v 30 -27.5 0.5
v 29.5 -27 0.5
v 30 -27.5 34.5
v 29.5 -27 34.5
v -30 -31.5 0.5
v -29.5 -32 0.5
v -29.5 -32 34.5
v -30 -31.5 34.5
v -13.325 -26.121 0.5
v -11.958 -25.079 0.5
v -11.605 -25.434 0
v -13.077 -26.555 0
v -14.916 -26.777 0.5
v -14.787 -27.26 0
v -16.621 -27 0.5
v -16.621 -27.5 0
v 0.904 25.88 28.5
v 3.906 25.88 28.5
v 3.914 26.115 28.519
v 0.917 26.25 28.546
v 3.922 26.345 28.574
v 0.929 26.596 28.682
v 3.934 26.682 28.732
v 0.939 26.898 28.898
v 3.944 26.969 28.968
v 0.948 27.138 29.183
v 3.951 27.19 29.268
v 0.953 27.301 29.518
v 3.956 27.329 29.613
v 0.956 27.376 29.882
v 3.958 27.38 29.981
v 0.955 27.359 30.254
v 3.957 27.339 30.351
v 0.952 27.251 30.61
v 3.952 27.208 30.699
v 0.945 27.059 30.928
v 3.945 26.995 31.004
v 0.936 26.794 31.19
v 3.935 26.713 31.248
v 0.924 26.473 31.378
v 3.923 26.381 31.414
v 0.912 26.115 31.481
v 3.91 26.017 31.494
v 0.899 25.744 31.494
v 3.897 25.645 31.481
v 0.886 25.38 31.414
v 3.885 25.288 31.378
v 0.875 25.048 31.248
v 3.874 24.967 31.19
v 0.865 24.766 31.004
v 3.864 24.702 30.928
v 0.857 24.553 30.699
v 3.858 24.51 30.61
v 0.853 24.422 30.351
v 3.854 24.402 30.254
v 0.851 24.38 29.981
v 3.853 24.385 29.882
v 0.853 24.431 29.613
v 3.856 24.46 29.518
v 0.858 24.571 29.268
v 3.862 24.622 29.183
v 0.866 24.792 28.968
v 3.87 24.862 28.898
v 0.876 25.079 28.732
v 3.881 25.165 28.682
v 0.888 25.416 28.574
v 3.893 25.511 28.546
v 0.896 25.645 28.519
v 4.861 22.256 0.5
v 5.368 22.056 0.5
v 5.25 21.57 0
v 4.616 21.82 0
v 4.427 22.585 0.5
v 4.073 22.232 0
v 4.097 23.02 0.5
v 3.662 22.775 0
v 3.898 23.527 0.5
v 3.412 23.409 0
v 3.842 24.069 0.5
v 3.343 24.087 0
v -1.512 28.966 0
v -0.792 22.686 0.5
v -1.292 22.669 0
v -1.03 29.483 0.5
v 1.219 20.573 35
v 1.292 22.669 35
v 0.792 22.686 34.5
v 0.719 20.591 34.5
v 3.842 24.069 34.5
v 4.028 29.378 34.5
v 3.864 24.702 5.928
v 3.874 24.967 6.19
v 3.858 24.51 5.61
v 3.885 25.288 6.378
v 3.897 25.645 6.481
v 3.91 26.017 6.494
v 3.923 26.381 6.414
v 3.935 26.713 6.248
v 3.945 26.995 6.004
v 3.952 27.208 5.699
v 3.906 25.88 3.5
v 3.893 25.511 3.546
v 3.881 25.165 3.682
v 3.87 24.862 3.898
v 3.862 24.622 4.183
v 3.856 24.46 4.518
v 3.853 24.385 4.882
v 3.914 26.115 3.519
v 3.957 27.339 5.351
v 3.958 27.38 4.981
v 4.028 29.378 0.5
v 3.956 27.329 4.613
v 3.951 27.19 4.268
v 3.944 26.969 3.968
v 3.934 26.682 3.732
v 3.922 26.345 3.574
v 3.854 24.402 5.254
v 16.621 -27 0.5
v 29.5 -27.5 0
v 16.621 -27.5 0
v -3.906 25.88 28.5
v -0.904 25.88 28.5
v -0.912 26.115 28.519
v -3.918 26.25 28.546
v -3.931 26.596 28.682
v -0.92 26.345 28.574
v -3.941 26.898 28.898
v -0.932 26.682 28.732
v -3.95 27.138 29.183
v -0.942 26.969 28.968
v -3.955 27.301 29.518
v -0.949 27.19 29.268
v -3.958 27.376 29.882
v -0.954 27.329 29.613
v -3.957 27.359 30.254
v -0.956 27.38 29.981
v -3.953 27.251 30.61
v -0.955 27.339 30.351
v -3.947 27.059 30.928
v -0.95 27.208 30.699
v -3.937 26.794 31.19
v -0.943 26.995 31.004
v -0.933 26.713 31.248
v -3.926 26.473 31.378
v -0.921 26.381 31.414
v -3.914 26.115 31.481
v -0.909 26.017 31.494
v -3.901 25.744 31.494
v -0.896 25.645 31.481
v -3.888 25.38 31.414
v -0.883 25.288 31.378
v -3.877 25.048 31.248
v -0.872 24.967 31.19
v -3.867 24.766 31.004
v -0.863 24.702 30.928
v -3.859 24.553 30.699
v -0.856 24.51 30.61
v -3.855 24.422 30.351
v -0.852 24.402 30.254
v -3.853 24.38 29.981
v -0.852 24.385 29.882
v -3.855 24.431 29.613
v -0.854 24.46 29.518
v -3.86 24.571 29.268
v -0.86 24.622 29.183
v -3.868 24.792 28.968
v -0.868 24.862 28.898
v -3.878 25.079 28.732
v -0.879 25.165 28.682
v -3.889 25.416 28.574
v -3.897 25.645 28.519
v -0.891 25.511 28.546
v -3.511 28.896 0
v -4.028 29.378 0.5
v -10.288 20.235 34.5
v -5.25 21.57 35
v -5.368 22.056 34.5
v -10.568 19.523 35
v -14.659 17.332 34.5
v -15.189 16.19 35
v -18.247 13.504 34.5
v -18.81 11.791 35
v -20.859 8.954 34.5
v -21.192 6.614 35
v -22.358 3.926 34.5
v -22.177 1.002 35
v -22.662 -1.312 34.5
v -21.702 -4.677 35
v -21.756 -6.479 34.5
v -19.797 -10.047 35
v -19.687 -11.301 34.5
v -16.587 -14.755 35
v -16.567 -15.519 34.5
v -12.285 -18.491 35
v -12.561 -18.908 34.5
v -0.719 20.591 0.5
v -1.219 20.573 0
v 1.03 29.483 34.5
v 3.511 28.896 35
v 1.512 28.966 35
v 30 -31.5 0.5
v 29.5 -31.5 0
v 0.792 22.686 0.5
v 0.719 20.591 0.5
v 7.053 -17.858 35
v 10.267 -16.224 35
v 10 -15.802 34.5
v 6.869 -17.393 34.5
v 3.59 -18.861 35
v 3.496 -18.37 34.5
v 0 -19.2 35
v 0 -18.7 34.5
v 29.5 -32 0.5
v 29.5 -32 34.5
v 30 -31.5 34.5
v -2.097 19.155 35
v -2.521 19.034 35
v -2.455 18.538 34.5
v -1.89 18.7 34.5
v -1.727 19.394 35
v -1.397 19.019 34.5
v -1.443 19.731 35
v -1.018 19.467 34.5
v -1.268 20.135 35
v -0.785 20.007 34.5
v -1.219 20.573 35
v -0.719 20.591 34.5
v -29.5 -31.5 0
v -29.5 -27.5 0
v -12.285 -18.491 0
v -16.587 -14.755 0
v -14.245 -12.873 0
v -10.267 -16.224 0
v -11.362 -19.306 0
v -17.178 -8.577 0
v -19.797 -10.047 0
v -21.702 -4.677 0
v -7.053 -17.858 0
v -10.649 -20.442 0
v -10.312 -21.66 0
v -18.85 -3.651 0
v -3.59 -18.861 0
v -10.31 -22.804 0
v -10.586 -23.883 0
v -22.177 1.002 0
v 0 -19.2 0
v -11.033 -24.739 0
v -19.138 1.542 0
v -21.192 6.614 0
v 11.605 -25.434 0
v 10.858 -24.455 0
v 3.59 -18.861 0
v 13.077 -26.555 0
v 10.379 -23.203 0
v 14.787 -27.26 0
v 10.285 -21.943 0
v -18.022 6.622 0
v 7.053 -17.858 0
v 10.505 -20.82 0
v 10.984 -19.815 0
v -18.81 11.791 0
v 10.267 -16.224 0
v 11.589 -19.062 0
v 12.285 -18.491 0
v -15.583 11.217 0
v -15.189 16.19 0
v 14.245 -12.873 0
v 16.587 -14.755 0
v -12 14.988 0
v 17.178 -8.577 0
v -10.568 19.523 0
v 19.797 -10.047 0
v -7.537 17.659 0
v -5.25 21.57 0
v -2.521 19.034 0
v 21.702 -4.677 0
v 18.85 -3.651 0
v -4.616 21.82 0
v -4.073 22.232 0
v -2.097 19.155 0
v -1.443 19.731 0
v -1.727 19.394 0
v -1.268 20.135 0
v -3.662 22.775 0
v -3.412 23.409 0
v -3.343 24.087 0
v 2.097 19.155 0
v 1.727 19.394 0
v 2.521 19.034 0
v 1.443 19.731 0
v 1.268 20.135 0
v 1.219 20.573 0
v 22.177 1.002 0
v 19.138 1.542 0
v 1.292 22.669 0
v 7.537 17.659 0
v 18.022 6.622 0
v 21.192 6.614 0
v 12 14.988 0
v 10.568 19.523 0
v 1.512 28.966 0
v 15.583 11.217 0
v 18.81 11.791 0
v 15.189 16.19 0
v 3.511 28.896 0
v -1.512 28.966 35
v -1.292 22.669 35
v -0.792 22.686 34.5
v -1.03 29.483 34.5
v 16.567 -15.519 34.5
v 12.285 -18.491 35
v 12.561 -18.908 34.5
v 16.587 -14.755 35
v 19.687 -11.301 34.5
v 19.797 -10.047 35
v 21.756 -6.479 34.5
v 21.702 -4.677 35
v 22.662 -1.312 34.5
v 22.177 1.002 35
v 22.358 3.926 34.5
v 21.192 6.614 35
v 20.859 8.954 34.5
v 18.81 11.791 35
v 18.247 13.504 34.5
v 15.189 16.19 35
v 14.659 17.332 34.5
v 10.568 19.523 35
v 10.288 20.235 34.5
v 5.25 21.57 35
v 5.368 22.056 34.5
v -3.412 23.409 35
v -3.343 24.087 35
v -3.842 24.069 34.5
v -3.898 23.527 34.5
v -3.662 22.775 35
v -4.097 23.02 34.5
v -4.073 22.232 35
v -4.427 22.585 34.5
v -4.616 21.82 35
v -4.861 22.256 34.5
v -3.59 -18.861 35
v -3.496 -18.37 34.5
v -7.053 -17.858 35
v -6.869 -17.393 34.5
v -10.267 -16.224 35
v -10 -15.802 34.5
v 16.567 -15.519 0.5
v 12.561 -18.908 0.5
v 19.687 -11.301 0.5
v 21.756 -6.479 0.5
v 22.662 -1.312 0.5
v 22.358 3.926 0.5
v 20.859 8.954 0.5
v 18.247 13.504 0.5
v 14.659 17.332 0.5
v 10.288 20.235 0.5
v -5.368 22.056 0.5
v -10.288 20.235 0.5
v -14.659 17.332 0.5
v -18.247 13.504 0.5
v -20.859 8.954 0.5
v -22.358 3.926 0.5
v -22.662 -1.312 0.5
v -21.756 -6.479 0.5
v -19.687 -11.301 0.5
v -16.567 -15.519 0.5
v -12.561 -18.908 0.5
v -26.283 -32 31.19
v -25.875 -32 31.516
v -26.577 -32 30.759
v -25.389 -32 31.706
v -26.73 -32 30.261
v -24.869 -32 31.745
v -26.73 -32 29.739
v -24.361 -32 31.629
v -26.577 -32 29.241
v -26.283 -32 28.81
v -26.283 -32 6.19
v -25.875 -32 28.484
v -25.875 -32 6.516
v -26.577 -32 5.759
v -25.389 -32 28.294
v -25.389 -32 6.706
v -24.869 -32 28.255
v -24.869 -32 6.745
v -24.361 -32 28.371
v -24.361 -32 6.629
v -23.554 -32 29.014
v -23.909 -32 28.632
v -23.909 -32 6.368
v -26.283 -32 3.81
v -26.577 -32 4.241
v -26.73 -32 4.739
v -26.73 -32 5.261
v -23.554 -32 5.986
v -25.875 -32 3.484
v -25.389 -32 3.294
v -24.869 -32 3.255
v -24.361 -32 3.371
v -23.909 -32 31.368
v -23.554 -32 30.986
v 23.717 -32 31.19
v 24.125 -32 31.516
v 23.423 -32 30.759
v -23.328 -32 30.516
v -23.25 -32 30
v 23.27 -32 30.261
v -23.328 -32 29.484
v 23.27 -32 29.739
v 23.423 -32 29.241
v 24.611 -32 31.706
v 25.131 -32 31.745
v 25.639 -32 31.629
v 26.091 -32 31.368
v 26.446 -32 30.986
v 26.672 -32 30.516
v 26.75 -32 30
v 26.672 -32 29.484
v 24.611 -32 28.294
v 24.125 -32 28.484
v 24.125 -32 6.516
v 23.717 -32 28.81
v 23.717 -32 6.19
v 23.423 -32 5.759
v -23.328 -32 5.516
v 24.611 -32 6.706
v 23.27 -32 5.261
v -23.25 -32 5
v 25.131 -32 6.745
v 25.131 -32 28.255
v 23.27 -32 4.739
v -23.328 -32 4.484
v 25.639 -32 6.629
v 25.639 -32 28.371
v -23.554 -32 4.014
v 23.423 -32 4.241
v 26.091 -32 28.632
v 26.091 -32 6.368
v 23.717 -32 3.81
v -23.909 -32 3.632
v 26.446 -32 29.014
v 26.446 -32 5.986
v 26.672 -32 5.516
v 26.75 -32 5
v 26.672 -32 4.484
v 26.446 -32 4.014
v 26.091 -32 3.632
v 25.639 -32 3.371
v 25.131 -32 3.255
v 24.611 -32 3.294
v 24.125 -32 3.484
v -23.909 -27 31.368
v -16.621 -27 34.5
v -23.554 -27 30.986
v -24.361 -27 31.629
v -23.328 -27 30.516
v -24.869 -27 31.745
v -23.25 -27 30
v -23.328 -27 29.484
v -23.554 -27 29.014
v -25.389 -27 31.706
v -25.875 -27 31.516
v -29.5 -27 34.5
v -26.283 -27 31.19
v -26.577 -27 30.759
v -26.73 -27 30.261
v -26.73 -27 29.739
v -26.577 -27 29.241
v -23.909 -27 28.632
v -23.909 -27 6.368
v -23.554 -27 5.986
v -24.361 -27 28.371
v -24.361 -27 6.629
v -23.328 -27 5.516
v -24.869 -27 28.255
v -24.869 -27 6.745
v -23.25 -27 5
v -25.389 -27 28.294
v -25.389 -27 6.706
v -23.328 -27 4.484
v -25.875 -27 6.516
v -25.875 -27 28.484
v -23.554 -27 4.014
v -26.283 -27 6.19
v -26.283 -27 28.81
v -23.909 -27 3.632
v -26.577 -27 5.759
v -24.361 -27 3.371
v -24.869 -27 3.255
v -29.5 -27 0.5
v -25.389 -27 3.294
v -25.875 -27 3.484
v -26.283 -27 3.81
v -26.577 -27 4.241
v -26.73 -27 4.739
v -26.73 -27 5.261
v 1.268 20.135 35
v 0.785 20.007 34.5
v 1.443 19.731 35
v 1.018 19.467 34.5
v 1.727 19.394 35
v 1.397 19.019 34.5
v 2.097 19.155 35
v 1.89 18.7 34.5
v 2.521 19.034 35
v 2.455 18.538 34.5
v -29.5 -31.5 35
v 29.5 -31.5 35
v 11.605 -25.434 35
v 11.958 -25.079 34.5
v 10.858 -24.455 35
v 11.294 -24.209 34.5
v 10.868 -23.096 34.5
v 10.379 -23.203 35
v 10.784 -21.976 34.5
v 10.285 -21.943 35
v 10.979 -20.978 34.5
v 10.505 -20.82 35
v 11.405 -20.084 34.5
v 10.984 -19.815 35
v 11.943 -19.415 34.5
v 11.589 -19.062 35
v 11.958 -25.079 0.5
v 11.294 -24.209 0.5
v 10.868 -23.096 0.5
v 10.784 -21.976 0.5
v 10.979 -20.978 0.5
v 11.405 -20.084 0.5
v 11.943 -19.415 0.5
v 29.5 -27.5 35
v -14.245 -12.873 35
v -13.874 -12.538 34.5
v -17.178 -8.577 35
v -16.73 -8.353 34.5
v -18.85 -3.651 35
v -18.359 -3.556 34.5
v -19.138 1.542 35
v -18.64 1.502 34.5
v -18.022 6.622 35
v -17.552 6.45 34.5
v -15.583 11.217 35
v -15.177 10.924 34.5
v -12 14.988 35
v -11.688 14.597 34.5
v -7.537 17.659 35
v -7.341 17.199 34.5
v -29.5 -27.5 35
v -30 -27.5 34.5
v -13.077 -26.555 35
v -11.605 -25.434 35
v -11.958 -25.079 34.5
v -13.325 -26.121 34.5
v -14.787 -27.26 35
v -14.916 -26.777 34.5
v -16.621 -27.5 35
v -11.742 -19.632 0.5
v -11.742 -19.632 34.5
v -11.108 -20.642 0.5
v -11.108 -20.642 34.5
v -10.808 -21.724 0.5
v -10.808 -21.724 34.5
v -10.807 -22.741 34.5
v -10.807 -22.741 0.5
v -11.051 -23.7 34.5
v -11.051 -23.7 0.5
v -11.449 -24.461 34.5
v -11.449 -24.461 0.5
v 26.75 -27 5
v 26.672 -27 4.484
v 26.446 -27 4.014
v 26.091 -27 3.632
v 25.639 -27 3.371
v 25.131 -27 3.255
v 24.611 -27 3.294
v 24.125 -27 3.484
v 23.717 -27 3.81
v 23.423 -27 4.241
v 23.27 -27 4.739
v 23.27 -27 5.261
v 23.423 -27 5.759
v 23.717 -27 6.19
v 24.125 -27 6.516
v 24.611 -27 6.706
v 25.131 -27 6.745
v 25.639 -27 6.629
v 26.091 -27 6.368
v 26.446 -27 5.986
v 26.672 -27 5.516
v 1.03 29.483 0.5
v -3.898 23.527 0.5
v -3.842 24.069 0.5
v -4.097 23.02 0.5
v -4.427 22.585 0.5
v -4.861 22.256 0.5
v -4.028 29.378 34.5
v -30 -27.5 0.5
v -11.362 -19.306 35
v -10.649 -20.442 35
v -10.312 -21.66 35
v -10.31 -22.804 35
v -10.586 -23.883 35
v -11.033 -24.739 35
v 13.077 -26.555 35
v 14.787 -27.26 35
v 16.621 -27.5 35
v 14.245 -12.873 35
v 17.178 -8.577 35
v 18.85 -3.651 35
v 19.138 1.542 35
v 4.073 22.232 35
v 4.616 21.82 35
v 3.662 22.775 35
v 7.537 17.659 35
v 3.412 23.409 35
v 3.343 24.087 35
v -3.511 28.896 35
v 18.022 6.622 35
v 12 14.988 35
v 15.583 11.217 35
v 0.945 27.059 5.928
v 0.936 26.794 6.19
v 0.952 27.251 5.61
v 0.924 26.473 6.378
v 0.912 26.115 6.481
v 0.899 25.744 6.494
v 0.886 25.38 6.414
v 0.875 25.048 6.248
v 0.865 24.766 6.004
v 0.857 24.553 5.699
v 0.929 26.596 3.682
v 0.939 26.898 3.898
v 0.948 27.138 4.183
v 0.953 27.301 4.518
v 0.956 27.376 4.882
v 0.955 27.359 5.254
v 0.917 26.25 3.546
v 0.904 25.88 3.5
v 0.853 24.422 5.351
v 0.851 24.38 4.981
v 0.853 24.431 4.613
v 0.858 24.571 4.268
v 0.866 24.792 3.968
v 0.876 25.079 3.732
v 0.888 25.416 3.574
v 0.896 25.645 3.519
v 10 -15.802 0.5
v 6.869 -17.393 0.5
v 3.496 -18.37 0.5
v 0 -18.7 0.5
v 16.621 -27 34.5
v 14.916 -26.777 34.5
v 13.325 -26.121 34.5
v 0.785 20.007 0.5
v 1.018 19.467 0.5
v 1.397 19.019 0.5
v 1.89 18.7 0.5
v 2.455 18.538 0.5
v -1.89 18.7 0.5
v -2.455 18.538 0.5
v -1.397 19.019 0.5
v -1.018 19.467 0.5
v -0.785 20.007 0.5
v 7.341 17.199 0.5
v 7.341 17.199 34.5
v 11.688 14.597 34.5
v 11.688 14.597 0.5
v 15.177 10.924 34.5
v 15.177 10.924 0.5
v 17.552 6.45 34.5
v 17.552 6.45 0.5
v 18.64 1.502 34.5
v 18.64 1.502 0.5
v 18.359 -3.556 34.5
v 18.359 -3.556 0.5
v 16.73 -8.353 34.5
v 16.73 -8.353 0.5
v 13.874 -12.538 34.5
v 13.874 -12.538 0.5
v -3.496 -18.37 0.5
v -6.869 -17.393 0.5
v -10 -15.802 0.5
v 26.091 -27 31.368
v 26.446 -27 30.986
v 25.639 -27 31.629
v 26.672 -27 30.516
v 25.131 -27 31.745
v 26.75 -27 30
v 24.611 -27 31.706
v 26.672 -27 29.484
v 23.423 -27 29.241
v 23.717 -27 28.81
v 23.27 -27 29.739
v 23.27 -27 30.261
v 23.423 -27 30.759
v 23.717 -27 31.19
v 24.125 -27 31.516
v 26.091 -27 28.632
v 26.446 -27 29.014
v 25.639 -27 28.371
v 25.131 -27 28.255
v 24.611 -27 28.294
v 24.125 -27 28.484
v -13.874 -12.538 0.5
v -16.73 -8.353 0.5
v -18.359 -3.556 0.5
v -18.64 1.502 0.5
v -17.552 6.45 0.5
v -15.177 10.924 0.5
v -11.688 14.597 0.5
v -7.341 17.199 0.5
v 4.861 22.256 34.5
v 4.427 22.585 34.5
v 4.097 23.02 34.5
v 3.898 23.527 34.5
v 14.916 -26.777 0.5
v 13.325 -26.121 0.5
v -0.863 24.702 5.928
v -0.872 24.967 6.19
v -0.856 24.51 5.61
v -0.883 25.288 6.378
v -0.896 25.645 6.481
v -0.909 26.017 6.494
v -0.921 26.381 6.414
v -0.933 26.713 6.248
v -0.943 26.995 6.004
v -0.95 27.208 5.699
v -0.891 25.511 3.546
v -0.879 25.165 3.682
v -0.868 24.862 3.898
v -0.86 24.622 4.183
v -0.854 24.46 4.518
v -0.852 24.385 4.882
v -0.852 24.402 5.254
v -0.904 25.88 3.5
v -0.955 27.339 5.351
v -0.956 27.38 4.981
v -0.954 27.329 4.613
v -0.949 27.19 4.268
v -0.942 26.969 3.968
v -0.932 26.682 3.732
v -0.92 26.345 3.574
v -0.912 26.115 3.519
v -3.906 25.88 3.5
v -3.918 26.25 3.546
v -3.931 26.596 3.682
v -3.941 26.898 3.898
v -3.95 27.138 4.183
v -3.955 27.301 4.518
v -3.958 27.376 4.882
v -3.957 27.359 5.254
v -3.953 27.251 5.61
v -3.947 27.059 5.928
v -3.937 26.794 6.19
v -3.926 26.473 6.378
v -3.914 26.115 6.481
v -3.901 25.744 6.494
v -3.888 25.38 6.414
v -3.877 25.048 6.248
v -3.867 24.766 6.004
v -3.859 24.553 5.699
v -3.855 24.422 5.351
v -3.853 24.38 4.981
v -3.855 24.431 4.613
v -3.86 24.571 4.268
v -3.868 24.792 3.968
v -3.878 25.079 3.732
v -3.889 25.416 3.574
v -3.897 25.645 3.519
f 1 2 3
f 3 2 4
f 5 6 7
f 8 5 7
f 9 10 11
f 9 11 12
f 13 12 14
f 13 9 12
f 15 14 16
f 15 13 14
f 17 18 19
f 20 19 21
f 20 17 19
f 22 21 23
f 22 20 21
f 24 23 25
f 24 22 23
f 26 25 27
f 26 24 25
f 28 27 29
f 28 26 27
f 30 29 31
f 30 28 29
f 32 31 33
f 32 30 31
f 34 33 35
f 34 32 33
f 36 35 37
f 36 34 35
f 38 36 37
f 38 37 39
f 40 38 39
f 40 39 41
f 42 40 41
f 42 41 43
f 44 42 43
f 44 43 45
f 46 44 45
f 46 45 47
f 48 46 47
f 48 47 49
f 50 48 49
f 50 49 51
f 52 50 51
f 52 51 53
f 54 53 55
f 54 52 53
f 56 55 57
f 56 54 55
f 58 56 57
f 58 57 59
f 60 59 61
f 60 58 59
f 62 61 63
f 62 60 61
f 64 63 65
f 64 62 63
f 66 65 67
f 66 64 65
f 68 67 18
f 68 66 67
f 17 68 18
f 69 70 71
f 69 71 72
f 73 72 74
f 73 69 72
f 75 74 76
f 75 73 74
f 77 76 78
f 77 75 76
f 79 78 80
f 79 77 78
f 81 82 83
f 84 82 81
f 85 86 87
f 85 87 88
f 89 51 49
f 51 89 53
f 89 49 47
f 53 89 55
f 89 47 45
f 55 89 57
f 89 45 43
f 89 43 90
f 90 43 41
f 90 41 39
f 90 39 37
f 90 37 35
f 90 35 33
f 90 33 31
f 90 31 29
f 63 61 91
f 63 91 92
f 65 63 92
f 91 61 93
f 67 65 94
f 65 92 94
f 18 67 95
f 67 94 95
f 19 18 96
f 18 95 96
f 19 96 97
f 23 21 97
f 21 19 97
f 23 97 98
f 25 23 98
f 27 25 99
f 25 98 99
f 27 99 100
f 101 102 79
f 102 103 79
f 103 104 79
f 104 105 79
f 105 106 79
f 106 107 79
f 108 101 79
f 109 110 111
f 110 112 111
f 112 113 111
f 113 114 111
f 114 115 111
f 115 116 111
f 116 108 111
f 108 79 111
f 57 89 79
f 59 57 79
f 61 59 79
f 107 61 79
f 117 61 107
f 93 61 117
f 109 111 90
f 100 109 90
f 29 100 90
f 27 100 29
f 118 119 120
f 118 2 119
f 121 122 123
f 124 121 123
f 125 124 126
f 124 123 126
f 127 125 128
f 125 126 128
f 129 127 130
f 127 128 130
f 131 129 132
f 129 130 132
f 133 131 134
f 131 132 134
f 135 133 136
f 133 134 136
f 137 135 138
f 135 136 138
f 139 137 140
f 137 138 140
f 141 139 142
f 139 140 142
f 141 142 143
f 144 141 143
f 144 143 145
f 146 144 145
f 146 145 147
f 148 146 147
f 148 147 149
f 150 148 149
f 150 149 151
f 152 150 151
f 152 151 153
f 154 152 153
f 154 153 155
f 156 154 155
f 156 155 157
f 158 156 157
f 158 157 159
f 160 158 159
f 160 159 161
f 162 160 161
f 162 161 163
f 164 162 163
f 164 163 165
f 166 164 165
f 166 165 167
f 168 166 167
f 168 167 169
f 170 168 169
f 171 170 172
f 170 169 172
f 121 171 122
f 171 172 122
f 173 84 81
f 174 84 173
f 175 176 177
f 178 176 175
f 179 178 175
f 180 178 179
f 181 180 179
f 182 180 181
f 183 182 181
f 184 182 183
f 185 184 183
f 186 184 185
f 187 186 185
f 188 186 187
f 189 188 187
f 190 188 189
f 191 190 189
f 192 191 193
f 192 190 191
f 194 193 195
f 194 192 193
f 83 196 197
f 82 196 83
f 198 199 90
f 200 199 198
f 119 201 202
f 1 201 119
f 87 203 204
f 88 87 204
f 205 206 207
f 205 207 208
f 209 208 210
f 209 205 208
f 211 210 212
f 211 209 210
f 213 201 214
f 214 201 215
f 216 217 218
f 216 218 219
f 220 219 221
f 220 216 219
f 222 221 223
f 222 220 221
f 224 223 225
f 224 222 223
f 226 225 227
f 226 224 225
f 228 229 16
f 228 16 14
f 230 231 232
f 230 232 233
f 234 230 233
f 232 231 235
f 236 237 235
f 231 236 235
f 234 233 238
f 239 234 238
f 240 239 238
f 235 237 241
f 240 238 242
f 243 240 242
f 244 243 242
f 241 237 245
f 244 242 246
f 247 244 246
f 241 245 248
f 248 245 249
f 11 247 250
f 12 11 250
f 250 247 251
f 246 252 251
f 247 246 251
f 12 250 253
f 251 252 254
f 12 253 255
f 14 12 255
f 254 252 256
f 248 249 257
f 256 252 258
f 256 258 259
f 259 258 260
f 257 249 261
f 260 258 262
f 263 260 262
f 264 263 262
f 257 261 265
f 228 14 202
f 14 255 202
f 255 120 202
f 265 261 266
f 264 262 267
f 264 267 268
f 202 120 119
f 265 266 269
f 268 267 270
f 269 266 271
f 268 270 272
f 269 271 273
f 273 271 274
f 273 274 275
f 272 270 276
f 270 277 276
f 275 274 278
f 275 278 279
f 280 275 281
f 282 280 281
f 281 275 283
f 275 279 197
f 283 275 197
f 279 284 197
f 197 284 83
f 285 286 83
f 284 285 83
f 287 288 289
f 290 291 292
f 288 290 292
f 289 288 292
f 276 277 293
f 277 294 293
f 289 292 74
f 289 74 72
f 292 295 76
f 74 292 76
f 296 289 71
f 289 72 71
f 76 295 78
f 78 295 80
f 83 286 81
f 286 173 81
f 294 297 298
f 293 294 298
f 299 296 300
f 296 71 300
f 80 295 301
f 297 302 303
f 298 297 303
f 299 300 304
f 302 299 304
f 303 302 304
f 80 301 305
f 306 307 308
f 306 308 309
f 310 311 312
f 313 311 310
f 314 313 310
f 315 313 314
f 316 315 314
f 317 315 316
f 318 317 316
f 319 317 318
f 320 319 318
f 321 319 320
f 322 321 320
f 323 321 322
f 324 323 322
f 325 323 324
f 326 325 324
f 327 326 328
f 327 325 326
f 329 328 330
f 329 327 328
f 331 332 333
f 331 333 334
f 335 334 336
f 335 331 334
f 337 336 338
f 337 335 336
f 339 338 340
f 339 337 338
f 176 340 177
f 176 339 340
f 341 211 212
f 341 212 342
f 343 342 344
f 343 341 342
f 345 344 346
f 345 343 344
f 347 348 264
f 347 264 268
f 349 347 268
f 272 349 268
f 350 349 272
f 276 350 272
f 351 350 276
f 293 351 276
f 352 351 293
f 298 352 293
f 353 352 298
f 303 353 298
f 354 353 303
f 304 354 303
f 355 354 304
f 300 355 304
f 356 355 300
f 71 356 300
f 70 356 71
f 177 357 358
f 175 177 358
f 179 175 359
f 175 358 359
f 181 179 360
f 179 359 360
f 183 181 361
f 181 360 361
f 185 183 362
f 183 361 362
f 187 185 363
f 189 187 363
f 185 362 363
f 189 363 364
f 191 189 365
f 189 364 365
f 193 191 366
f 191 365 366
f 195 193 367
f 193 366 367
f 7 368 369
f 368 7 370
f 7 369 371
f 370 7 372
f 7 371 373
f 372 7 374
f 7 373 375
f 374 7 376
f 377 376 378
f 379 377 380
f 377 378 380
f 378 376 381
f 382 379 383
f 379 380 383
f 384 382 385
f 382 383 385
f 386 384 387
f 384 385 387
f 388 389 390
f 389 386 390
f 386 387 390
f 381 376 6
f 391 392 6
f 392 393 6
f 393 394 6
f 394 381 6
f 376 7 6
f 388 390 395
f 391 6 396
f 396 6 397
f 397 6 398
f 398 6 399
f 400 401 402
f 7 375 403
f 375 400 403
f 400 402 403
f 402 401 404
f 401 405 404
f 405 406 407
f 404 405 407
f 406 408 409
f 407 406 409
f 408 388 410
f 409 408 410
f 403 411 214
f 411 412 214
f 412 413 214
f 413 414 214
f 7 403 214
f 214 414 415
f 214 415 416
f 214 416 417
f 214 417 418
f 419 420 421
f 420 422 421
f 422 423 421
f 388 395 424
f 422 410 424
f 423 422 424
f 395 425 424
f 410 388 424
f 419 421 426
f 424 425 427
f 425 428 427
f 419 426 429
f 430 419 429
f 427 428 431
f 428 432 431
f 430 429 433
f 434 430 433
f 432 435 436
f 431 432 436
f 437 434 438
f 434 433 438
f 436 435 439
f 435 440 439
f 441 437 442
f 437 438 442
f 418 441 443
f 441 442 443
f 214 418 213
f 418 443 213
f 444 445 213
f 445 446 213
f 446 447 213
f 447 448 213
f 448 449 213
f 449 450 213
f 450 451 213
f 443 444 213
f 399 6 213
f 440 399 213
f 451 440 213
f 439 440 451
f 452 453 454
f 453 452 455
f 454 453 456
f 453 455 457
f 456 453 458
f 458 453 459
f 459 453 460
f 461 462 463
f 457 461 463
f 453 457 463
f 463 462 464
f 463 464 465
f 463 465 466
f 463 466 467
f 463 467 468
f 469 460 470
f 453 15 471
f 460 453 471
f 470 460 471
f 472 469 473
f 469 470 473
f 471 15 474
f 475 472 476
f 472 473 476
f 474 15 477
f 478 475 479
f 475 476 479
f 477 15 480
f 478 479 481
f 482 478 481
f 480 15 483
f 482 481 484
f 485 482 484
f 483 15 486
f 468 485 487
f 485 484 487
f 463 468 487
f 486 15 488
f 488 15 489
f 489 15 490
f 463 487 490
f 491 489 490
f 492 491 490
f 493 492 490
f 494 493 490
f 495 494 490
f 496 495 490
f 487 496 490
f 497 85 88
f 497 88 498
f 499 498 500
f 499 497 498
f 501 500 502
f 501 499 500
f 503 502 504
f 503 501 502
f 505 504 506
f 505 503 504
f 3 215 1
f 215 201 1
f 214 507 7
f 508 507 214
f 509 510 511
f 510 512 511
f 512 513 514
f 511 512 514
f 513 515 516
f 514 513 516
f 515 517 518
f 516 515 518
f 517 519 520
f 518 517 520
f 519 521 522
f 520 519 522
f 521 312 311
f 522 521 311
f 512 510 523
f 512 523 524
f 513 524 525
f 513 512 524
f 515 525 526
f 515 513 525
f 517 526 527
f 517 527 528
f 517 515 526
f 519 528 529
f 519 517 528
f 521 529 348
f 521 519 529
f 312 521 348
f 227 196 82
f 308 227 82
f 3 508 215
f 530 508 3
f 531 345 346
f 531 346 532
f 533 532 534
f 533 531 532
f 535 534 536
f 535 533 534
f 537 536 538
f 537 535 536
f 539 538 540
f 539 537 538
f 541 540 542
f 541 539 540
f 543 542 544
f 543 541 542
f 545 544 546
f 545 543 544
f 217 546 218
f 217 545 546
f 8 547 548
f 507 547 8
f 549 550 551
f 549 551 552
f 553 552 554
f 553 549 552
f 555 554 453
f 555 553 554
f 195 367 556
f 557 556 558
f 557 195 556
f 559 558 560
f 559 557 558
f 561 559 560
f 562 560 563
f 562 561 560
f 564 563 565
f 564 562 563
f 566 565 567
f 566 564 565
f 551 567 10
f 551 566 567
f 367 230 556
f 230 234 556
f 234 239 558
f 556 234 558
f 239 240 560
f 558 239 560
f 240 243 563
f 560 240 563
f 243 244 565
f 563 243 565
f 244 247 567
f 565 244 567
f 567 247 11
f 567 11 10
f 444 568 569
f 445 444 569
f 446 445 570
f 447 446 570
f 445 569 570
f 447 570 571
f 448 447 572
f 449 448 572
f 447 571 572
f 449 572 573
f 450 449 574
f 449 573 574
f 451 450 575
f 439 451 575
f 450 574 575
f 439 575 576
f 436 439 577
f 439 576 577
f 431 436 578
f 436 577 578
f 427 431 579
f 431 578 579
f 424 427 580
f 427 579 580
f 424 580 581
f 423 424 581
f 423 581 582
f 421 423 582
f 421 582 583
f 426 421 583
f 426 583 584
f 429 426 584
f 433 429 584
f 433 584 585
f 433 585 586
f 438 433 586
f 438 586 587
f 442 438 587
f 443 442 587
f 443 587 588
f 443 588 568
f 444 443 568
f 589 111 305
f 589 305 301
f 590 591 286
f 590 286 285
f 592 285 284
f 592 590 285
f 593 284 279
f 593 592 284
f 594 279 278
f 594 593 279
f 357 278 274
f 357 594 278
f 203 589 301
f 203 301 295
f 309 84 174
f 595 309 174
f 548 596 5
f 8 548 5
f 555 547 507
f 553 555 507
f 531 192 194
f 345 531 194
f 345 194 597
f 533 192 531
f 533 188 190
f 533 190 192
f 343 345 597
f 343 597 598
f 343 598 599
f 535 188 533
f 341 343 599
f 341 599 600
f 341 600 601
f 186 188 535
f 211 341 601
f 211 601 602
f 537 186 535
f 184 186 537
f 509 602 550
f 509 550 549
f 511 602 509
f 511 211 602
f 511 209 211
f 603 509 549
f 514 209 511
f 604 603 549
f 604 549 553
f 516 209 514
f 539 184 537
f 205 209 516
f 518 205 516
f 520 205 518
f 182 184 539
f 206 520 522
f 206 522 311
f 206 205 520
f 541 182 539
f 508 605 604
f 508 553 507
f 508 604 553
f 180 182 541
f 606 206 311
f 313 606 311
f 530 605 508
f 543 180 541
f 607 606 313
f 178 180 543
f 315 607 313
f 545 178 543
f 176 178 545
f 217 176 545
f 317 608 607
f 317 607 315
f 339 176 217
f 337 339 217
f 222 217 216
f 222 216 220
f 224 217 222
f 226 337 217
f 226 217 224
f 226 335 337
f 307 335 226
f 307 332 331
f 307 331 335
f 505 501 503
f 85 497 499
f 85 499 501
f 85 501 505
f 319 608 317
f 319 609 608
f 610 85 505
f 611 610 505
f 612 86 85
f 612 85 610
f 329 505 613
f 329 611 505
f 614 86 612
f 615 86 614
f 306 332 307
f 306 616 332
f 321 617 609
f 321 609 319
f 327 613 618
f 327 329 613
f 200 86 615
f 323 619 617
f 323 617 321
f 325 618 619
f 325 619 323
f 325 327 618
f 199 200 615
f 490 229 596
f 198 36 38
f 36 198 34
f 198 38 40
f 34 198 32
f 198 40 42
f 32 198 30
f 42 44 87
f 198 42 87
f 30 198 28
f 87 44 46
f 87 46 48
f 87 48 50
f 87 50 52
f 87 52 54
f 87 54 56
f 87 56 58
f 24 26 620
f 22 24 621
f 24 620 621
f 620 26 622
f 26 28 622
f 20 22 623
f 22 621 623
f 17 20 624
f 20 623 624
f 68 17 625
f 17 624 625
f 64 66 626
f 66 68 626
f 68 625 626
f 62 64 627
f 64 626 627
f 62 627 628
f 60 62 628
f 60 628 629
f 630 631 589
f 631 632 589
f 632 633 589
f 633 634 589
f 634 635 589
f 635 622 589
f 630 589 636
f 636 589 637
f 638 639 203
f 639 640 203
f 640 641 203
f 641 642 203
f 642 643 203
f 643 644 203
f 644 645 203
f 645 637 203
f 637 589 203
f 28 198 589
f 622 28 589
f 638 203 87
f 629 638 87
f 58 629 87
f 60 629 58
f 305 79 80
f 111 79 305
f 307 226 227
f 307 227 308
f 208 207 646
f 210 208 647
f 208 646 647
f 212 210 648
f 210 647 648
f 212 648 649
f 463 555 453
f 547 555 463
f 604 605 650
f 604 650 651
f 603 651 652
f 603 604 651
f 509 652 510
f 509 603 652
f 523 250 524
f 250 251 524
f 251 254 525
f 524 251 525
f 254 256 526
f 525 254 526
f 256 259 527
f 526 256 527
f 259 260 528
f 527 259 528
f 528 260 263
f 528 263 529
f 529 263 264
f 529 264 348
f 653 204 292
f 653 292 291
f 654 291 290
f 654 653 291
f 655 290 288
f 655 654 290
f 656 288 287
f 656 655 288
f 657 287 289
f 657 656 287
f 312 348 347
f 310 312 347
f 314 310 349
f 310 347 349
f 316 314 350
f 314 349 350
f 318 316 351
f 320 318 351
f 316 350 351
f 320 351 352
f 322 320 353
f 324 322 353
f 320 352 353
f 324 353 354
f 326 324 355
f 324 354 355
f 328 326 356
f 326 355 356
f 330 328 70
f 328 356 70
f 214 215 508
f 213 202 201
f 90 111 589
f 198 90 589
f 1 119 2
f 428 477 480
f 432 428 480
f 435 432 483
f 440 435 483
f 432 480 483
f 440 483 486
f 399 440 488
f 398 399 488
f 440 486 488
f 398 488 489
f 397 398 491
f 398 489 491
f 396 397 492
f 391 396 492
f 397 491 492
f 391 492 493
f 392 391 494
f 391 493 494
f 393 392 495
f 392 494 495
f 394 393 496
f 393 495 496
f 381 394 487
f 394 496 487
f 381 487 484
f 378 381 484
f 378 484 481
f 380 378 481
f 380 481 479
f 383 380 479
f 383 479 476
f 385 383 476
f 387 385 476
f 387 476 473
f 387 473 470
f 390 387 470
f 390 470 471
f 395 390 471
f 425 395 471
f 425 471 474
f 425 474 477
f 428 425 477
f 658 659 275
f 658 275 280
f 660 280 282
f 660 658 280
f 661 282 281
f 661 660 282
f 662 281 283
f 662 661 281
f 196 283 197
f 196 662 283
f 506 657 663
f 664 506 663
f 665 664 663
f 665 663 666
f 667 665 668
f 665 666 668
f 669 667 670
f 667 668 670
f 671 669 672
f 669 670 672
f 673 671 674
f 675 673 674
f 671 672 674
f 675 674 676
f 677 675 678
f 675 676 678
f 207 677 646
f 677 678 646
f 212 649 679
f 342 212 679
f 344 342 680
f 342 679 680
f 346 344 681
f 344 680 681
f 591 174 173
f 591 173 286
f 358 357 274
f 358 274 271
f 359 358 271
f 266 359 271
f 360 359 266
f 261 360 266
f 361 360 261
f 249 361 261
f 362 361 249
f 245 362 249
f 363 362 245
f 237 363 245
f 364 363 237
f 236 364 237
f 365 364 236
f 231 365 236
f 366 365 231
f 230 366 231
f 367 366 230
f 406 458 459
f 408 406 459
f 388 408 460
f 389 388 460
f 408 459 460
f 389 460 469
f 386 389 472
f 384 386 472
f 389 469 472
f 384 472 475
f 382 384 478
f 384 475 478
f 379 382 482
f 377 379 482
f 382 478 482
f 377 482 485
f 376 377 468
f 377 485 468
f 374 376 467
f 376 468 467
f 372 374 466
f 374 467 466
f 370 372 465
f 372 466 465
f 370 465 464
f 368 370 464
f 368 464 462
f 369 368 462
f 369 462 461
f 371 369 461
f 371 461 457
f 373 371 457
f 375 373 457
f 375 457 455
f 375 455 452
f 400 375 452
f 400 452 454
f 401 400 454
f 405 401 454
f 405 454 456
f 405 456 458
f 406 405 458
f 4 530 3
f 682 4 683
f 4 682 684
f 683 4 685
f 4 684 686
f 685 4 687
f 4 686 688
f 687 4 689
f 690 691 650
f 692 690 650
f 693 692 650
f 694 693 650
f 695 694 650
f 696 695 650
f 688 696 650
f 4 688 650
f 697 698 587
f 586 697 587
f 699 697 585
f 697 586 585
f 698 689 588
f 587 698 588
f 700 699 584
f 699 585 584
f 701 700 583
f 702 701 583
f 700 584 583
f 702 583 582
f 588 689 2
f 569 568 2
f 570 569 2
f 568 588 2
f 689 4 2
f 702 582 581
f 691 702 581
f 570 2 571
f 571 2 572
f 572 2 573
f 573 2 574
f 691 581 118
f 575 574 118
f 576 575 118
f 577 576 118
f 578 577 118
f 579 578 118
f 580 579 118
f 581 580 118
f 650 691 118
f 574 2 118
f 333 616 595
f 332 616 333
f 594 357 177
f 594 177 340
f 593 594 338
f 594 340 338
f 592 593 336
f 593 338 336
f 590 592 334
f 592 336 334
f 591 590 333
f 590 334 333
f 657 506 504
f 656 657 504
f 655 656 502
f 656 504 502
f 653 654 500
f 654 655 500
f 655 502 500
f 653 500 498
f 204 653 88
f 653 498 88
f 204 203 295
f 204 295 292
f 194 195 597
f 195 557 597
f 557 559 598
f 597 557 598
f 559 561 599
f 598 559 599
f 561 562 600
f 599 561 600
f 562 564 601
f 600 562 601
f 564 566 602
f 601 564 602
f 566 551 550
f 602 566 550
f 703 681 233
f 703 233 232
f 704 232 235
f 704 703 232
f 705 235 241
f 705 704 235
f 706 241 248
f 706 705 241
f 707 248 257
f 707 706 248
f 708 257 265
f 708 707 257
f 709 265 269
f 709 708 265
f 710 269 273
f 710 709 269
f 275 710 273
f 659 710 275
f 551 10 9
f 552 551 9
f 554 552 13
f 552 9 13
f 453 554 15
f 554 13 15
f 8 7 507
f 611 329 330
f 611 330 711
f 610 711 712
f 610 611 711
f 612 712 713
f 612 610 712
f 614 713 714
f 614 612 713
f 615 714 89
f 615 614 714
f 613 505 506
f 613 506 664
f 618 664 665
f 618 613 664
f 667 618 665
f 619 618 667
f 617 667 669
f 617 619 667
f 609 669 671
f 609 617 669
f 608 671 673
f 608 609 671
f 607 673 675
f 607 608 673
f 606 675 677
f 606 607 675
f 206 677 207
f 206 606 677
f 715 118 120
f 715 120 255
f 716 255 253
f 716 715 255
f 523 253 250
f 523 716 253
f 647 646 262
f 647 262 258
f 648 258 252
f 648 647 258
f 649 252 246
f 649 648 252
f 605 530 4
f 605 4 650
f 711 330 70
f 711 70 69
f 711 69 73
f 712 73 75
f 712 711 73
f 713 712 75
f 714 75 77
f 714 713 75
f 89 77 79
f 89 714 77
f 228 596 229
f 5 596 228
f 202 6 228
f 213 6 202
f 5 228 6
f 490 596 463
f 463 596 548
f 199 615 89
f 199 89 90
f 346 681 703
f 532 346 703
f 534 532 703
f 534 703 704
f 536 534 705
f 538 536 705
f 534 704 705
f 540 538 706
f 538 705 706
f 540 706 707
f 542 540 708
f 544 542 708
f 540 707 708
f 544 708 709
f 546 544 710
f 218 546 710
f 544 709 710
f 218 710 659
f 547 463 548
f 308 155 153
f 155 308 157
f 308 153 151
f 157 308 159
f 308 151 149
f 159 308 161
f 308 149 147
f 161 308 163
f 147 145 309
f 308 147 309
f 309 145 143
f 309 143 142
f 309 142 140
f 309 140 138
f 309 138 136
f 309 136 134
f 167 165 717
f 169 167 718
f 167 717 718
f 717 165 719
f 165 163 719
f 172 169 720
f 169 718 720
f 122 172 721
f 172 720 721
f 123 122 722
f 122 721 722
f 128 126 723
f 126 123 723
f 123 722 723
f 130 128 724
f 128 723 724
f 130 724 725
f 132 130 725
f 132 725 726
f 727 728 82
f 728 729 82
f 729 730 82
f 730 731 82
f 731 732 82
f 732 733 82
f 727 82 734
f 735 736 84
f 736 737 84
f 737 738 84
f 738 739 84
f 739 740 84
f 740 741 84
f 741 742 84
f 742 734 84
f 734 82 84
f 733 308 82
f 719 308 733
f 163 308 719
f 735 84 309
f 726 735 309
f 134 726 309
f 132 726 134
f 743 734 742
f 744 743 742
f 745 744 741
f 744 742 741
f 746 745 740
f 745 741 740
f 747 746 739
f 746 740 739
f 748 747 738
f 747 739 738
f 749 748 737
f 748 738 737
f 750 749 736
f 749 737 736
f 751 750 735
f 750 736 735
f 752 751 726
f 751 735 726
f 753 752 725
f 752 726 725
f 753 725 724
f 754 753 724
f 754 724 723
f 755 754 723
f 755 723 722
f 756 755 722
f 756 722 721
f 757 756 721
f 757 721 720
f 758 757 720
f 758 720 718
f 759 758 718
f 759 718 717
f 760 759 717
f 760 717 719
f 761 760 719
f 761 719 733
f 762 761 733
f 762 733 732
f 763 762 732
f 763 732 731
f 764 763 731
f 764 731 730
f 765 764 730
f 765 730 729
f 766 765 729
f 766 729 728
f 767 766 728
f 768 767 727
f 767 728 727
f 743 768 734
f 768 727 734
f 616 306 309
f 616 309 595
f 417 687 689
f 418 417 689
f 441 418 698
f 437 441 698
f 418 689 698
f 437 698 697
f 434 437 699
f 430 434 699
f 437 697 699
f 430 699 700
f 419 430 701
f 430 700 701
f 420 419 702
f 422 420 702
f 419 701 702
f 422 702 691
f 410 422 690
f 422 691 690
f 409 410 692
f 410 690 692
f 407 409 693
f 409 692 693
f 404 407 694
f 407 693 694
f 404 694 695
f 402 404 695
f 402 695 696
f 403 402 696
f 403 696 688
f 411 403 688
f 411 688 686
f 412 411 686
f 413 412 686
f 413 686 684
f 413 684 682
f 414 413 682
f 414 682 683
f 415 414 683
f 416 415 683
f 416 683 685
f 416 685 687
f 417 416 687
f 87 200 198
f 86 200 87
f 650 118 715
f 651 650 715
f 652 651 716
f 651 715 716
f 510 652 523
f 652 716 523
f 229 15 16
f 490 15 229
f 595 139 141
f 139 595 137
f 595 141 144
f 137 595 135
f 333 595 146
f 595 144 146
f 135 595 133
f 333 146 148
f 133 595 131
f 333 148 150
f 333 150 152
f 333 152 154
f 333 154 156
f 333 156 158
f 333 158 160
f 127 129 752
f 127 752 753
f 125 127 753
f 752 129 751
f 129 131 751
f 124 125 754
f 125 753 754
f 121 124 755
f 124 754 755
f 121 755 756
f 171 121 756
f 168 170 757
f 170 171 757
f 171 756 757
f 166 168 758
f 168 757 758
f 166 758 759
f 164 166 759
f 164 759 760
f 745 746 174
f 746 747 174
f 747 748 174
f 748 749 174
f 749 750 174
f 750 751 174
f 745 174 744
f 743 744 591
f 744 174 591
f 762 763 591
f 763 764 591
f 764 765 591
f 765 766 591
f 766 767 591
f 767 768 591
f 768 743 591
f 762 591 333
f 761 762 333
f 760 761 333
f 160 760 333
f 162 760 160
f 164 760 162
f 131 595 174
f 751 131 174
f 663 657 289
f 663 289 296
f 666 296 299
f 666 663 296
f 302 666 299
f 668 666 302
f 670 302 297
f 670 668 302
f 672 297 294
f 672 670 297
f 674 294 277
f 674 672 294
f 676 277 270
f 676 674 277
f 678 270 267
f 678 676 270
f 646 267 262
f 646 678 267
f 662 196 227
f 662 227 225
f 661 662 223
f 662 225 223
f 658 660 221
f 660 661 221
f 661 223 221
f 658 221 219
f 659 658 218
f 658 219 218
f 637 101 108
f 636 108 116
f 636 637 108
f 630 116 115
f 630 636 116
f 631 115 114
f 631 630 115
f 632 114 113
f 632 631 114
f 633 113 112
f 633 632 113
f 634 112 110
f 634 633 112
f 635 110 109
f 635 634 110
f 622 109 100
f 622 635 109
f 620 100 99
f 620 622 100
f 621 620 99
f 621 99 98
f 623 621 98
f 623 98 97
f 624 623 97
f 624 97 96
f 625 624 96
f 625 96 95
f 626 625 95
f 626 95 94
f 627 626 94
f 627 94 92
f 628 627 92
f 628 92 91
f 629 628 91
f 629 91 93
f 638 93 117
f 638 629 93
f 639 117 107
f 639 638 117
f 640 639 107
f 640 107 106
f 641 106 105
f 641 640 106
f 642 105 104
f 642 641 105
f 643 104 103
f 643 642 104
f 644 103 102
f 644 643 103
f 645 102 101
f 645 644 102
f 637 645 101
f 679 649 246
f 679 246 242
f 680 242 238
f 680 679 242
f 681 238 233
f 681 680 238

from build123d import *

# Parameters (mm, degrees)
BOSS_EXTRUDE1_DEPTH     = 35
SKETCH2_R               = 1.5
CUT_EXTRUDE1_DEPTH      = 31
CUT_EXTRUDE1_DEPTH_BACK = 31
SKETCH3_R               = 1.75
CUT_EXTRUDE2_DEPTH      = 6
FILLET1_R               = 4
FILLET2_R               = 2
CHAMFER1_SIZE           = 0.5


with BuildPart() as part:
    # Sketch1 → Boss-Extrude1 (new body)
    with BuildSketch(Plane.XY):
        with BuildLine():
            ThreePointArc((-10, -15.801582199), (-18.048902858, 4.891534078), (-0.652620588, 18.688608465))
            Line((-0.652620588, 18.688608465), (-0.792218575, 22.686171773))
            ThreePointArc((-0.792218575, 22.686171773), (-2.292863817, 22.583905232), (-3.783442178, 22.382483448))
            ThreePointArc((-3.783442178, 22.382483448), (-22.463854977, 3.265764775), (-10, -20.378665314))
            Line((-10, -20.378665314), (-10, -15.801582199))
        make_face()
        with BuildLine():
            Line((0, -22.7), (0, -18.7))
            ThreePointArc((0, -18.7), (-5.205785862, -17.960784882), (-10, -15.801582199))
            Line((-10, -15.801582199), (-10, -20.378665314))
            ThreePointArc((-10, -20.378665314), (-5.132947368, -22.112052173), (0, -22.7))
        make_face()
        with BuildLine():
            ThreePointArc((10, -15.801582199), (5.205785862, -17.960784882), (0, -18.7))
            Line((0, -18.7), (0, -22.7))
            ThreePointArc((0, -22.7), (5.132947368, -22.112052173), (10, -20.378665314))
            Line((10, -20.378665314), (10, -15.801582199))
        make_face()
        with BuildLine():
            Line((0.792218575, 22.686171773), (0.652620588, 18.688608465))
            ThreePointArc((0.652620588, 18.688608465), (18.048902858, 4.891534078), (10, -15.801582199))
            Line((10, -15.801582199), (10, -20.378665314))
            ThreePointArc((10, -20.378665314), (22.463854977, 3.265764775), (3.783442178, 22.382483448))
            ThreePointArc((3.783442178, 22.382483448), (2.292863817, 22.583905232), (0.792218575, 22.686171773))
        make_face()
        with BuildLine():
            ThreePointArc((10, -20.378665314), (5.132947368, -22.112052173), (0, -22.7))
            Line((0, -22.7), (0, -32))
            Line((0, -32), (30, -32))
            Line((30, -32), (30, -27))
            Line((30, -27), (16.621334686, -27))
            ThreePointArc((16.621334686, -27), (11.939344029, -25.060655971), (10, -20.378665314))
        make_face()
        with BuildLine():
            Line((0, -32), (0, -22.7))
            ThreePointArc((0, -22.7), (-5.132947368, -22.112052173), (-10, -20.378665314))
            ThreePointArc((-10, -20.378665314), (-11.939344029, -25.060655971), (-16.621334686, -27))
            Line((-16.621334686, -27), (-30, -27))
            Line((-30, -27), (-30, -32))
            Line((-30, -32), (0, -32))
        make_face()
        with BuildLine():
            ThreePointArc((-3.783442178, 22.382483448), (-2.292863817, 22.583905232), (-0.792218575, 22.686171773))
            Line((-0.792218575, 22.686171773), (-1.029566174, 29.482917727))
            Line((-1.029566174, 29.482917727), (-4.027738655, 29.378219237))
            Line((-4.027738655, 29.378219237), (-3.783442178, 22.382483448))
        make_face()
        with BuildLine():
            Line((1.029566174, 29.482917727), (0.792218575, 22.686171773))
            ThreePointArc((0.792218575, 22.686171773), (2.292863817, 22.583905232), (3.783442178, 22.382483448))
            Line((3.783442178, 22.382483448), (4.027738655, 29.378219237))
            Line((4.027738655, 29.378219237), (1.029566174, 29.482917727))
        make_face()
    extrude(amount=BOSS_EXTRUDE1_DEPTH)

    # Sketch2 → Cut-Extrude1 (cut, two sides)
    with BuildSketch(Plane(origin=(0, 0, 0), x_dir=(0, 0, -1), z_dir=(1, 0, 0))) as cut_extrude1_sk:
        with Locations((-30, 25.880351342)):
            Circle(SKETCH2_R)
        with Locations((-5, 25.880351342)):
            Circle(SKETCH2_R)
    extrude(amount=CUT_EXTRUDE1_DEPTH, mode=Mode.SUBTRACT)
    extrude(cut_extrude1_sk.sketch, amount=-CUT_EXTRUDE1_DEPTH_BACK, mode=Mode.SUBTRACT)

    # Sketch3 → Cut-Extrude2 (cut, through all)
    with BuildSketch(Plane(origin=(0, -27, 0), x_dir=(1, 0, 0), z_dir=(0, 1, 0))):
        with Locations((-25, -5)):
            Circle(SKETCH3_R)
        with Locations((-25, -30)):
            Circle(SKETCH3_R)
        with Locations((25, -30)):
            Circle(SKETCH3_R)
        with Locations((25, -5)):
            Circle(SKETCH3_R)
    extrude(amount=-CUT_EXTRUDE2_DEPTH, mode=Mode.SUBTRACT)

    # Fillet1
    fillet1_edges = [part.edges().sort_by_distance(p)[0] for p in [
        (-10, -20.378665314, 17.5),
        (10, -20.378665314, 17.5),
    ]]
    fillet(fillet1_edges, radius=FILLET1_R)

    # Fillet2
    fillet2_edges = [part.edges().sort_by_distance(p)[0] for p in [
        (-3.783442178, 22.382483448, 17.5),
        (-0.652620588, 18.688608465, 17.5),
        (0.652620588, 18.688608465, 17.5),
        (3.783442178, 22.382483448, 17.5),
    ]]
    fillet(fillet2_edges, radius=FILLET2_R)

    # Chamfer1
    chamfer1_edges = [part.edges().sort_by_distance(p)[0] for p in [
        (30, -29.5, 35),
        (-0.874302959, 25.03676097, 0),
        (-0.874302959, 25.03676097, 35),
        (-22.357902089, 3.926094008, 0),
        (-17.579381492, -6.376154512, 0),
        (0.874302959, 25.03676097, 0),
        (1.190855047, 19.229149784, 0),
        (-1.190855047, 19.229149784, 0),
        (-17.579381492, -6.376154512, 35),
        (0.874302959, 25.03676097, 35),
        (-22.357902089, 3.926094008, 35),
        (1.190855047, 19.229149784, 35),
        (-1.190855047, 19.229149784, 35),
        (4.247231716, 22.791302098, 0),
        (4.247231716, 22.791302098, 35),
        (-4.247231716, 22.791302098, 0),
        (-4.247231716, 22.791302098, 35),
        (23.310667343, -27, 35),
        (-30, -29.5, 0),
        (-23.310667343, -27, 0),
        (-14.099306205, -26.500874504, 0),
        (-3.935041139, 26.723709689, 0),
        (-2.528652414, 29.430568482, 0),
        (14.099306205, -26.500874504, 35),
        (2.528652414, 29.430568482, 0),
        (3.935041139, 26.723709689, 0),
        (14.099306205, -26.500874504, 0),
        (23.310667343, -27, 0),
        (30, -29.5, 0),
        (0, -32, 0),
        (3.935041139, 26.723709689, 35),
        (-30, -32, 17.5),
        (-30, -27, 17.5),
        (30, -27, 17.5),
        (30, -32, 17.5),
        (2.528652414, 29.430568482, 35),
        (0, -32, 35),
        (-2.528652414, 29.430568482, 35),
        (-3.935041139, 26.723709689, 35),
        (-14.099306205, -26.500874504, 35),
        (-23.310667343, -27, 35),
        (-30, -29.5, 35),
        (22.357902089, 3.926094008, 0),
        (22.357902089, 3.926094008, 35),
        (-10.793982585, -21.849764719, 0),
        (-10.793982585, -21.849764719, 35),
        (10.793982585, -21.849764719, 0),
        (10.793982585, -21.849764719, 35),
    ]]
    chamfer(chamfer1_edges, length=CHAMFER1_SIZE)


solid = part.part
